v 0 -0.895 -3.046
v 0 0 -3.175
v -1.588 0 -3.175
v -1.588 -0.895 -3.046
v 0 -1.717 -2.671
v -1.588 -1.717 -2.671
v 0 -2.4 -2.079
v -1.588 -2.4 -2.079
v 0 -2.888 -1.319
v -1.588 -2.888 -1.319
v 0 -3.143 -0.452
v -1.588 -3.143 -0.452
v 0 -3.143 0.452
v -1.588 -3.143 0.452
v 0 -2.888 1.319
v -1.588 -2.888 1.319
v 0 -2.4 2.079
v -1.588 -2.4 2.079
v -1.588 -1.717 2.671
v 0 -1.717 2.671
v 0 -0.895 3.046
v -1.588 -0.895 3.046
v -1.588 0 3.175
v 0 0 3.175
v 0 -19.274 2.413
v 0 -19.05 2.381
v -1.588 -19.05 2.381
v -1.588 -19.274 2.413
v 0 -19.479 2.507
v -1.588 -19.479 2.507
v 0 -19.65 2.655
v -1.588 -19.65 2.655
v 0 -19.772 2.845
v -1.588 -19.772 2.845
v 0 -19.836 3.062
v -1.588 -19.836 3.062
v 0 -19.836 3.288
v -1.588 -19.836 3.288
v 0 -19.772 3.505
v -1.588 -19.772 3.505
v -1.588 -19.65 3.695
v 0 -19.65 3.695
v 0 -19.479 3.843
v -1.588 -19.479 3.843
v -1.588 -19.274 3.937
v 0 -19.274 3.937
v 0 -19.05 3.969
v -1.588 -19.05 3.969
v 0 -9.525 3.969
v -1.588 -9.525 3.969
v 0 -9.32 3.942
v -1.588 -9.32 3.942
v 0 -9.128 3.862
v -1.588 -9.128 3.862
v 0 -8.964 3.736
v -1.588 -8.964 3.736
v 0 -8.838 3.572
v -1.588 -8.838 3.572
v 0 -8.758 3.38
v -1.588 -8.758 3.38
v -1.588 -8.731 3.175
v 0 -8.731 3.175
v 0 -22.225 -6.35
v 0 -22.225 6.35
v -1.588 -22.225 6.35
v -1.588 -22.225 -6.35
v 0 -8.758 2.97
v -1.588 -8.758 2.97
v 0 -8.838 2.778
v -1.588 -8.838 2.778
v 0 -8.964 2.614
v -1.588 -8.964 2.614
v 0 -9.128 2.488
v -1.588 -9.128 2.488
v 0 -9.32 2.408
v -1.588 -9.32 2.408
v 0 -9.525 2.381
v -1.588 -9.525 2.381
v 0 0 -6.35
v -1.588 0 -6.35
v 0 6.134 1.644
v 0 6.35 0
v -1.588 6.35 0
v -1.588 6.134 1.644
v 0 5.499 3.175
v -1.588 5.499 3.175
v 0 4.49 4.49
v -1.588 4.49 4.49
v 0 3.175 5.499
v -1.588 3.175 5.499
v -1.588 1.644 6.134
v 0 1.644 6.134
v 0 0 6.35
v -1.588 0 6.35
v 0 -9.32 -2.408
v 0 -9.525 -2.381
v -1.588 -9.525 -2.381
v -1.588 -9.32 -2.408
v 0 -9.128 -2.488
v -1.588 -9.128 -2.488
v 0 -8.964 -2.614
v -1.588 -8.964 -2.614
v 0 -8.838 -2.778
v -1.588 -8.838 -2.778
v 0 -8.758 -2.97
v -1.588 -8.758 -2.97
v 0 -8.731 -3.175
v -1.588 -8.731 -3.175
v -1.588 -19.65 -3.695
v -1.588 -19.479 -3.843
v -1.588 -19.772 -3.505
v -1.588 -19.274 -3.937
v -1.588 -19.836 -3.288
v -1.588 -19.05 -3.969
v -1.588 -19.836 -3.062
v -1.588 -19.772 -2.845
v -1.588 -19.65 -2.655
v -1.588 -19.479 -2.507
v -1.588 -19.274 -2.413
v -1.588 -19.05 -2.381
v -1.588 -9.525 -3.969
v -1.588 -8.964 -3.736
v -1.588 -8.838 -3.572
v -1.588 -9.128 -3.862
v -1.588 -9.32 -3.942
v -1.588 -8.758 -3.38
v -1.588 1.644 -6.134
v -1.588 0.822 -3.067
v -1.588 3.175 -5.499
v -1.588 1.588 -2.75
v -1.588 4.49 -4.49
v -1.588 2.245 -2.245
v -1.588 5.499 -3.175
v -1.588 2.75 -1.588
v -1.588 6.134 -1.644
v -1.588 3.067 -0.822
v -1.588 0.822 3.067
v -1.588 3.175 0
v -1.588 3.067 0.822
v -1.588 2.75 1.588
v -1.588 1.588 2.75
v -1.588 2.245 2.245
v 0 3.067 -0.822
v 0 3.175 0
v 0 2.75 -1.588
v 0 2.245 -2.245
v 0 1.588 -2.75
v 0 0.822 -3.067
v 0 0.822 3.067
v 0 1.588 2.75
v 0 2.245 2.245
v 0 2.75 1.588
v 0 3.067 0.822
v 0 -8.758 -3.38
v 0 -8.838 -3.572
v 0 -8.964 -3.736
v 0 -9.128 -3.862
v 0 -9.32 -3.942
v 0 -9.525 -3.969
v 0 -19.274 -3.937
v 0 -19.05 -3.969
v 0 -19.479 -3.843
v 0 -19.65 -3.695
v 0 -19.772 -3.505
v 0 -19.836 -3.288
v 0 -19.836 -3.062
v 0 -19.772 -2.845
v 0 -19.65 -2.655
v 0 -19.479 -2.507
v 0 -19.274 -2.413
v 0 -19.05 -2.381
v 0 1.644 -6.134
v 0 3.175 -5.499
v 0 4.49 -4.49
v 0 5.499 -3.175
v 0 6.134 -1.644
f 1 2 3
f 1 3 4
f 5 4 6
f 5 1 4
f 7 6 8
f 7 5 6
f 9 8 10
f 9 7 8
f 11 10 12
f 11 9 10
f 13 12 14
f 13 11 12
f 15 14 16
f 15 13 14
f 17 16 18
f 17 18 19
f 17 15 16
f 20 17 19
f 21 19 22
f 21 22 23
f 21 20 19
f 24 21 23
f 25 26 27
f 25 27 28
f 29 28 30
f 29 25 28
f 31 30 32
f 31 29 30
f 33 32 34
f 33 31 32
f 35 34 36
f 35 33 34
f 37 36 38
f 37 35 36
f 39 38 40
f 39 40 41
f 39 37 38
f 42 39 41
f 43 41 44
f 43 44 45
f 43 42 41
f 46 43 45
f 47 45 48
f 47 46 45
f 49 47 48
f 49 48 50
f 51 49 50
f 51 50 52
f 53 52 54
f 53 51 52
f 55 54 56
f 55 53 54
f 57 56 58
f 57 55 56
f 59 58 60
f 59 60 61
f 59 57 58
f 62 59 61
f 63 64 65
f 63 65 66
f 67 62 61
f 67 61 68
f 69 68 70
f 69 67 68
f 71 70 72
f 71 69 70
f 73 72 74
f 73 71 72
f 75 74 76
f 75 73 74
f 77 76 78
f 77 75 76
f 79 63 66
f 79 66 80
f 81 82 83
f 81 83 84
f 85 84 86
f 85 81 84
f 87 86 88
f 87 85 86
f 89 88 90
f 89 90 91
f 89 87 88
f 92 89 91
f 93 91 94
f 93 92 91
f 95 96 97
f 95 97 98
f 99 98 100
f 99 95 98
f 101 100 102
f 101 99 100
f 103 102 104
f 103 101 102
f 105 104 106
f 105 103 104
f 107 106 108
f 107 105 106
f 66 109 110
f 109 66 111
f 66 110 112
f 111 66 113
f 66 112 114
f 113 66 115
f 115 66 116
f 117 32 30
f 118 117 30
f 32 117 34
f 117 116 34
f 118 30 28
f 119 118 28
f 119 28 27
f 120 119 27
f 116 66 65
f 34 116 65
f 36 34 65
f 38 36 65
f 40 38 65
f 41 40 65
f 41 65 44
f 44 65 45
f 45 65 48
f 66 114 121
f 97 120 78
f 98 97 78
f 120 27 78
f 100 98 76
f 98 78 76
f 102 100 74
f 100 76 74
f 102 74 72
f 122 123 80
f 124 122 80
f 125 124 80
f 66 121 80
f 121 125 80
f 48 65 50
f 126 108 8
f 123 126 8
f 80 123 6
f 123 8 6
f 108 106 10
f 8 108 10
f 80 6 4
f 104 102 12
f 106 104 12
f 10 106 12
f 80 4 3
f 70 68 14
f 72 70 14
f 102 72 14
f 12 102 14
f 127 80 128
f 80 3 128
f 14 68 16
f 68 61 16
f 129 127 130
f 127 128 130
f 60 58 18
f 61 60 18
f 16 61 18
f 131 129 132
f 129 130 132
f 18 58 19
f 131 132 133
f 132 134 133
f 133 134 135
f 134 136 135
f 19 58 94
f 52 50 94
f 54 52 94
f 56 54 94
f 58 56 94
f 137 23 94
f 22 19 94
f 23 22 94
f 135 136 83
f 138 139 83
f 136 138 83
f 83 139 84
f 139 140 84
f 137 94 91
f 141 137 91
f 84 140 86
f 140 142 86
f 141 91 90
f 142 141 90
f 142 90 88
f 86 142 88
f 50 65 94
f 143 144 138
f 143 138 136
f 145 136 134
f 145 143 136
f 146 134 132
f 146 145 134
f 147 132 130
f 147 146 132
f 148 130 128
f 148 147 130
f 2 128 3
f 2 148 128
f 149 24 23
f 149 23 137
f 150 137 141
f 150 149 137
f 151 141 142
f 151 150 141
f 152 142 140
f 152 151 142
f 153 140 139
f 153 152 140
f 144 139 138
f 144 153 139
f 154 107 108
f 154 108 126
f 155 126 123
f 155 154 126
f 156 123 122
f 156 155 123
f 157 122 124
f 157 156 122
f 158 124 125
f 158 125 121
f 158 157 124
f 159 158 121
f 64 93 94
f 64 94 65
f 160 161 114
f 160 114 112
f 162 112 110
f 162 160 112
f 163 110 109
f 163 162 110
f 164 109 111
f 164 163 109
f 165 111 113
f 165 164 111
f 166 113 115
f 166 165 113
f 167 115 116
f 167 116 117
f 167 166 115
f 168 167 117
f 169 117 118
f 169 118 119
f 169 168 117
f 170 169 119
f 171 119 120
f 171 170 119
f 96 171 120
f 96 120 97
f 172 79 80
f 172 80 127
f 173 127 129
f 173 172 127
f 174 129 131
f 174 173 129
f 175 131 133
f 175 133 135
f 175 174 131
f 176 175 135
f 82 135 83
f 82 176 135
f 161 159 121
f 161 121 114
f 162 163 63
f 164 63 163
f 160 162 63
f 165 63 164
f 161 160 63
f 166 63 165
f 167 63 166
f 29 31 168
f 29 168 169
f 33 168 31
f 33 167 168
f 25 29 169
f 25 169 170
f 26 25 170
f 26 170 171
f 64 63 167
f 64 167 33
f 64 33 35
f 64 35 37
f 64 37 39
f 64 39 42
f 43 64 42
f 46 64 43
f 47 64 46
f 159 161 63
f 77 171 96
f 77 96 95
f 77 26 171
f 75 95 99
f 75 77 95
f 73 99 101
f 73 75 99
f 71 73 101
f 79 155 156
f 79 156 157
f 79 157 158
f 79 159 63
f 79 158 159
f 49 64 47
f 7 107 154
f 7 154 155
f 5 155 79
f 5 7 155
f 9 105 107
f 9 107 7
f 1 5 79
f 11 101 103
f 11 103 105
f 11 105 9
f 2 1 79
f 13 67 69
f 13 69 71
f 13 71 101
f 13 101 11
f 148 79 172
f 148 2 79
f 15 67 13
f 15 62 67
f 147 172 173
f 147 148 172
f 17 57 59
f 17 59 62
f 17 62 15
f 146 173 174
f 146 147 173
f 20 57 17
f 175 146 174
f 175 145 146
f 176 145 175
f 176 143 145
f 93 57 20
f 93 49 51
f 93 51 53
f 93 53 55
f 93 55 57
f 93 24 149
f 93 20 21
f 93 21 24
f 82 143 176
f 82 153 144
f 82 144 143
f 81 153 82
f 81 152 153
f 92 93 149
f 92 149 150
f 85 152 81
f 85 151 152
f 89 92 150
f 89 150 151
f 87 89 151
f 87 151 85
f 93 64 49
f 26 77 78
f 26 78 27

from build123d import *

# Parameters (mm, degrees)
F1_DEPTH = 1.5875


with BuildPart() as f1:
    # F0 (on Right) → F1 (new body)
    with BuildSketch(Plane.YZ):
        with BuildLine():
            ThreePointArc((0, -6.35), (4.4901280605, -4.4901280605), (6.35, 0))
            ThreePointArc((6.35, 0), (4.4901280605, 4.4901280605), (0, 6.35))
            Line((0, 6.35), (0, 3.175))
            ThreePointArc((0, 3.175), (2.2450640303, 2.2450640303), (3.175, 0))
            ThreePointArc((3.175, 0), (2.2450640303, -2.2450640303), (0, -3.175))
            Line((0, -3.175), (0, -6.35))
        make_face()
        with BuildLine():
            Line((0, 3.175), (0, 6.35))
            ThreePointArc((0, 6.35), (-6.35, 0), (0, -6.35))
            Line((0, -6.35), (0, -3.175))
            ThreePointArc((0, -3.175), (-3.175, 0), (0, 3.175))
        make_face()
        with BuildLine():
            ThreePointArc((0, -6.35), (-6.35, 0), (0, 6.35))
            Line((0, 6.35), (-22.225, 6.35))
            Line((-22.225, 6.35), (-22.225, -6.35))
            Line((-22.225, -6.35), (0, -6.35))
        make_face()
        with BuildLine():
            ThreePointArc((-9.525, -2.38125), (-8.9637339924, -2.6137339924), (-8.73125, -3.175))
            ThreePointArc((-8.73125, -3.175), (-8.9637339924, -3.7362660076), (-9.525, -3.96875))
            Line((-9.525, -3.96875), (-19.05, -3.96875))
            ThreePointArc((-19.05, -3.96875), (-19.84375, -3.175), (-19.05, -2.38125))
            Line((-19.05, -2.38125), (-9.525, -2.38125))
        make_face(mode=Mode.SUBTRACT)
        with BuildLine():
            ThreePointArc((-19.05, 2.38125), (-19.84375, 3.175), (-19.05, 3.96875))
            Line((-19.05, 3.96875), (-9.525, 3.96875))
            ThreePointArc((-9.525, 3.96875), (-8.9637339924, 3.7362660076), (-8.73125, 3.175))
            ThreePointArc((-8.73125, 3.175), (-8.9637339924, 2.6137339924), (-9.525, 2.38125))
            Line((-9.525, 2.38125), (-19.05, 2.38125))
        make_face(mode=Mode.SUBTRACT)
    extrude(amount=-F1_DEPTH)


solid = f1.part
